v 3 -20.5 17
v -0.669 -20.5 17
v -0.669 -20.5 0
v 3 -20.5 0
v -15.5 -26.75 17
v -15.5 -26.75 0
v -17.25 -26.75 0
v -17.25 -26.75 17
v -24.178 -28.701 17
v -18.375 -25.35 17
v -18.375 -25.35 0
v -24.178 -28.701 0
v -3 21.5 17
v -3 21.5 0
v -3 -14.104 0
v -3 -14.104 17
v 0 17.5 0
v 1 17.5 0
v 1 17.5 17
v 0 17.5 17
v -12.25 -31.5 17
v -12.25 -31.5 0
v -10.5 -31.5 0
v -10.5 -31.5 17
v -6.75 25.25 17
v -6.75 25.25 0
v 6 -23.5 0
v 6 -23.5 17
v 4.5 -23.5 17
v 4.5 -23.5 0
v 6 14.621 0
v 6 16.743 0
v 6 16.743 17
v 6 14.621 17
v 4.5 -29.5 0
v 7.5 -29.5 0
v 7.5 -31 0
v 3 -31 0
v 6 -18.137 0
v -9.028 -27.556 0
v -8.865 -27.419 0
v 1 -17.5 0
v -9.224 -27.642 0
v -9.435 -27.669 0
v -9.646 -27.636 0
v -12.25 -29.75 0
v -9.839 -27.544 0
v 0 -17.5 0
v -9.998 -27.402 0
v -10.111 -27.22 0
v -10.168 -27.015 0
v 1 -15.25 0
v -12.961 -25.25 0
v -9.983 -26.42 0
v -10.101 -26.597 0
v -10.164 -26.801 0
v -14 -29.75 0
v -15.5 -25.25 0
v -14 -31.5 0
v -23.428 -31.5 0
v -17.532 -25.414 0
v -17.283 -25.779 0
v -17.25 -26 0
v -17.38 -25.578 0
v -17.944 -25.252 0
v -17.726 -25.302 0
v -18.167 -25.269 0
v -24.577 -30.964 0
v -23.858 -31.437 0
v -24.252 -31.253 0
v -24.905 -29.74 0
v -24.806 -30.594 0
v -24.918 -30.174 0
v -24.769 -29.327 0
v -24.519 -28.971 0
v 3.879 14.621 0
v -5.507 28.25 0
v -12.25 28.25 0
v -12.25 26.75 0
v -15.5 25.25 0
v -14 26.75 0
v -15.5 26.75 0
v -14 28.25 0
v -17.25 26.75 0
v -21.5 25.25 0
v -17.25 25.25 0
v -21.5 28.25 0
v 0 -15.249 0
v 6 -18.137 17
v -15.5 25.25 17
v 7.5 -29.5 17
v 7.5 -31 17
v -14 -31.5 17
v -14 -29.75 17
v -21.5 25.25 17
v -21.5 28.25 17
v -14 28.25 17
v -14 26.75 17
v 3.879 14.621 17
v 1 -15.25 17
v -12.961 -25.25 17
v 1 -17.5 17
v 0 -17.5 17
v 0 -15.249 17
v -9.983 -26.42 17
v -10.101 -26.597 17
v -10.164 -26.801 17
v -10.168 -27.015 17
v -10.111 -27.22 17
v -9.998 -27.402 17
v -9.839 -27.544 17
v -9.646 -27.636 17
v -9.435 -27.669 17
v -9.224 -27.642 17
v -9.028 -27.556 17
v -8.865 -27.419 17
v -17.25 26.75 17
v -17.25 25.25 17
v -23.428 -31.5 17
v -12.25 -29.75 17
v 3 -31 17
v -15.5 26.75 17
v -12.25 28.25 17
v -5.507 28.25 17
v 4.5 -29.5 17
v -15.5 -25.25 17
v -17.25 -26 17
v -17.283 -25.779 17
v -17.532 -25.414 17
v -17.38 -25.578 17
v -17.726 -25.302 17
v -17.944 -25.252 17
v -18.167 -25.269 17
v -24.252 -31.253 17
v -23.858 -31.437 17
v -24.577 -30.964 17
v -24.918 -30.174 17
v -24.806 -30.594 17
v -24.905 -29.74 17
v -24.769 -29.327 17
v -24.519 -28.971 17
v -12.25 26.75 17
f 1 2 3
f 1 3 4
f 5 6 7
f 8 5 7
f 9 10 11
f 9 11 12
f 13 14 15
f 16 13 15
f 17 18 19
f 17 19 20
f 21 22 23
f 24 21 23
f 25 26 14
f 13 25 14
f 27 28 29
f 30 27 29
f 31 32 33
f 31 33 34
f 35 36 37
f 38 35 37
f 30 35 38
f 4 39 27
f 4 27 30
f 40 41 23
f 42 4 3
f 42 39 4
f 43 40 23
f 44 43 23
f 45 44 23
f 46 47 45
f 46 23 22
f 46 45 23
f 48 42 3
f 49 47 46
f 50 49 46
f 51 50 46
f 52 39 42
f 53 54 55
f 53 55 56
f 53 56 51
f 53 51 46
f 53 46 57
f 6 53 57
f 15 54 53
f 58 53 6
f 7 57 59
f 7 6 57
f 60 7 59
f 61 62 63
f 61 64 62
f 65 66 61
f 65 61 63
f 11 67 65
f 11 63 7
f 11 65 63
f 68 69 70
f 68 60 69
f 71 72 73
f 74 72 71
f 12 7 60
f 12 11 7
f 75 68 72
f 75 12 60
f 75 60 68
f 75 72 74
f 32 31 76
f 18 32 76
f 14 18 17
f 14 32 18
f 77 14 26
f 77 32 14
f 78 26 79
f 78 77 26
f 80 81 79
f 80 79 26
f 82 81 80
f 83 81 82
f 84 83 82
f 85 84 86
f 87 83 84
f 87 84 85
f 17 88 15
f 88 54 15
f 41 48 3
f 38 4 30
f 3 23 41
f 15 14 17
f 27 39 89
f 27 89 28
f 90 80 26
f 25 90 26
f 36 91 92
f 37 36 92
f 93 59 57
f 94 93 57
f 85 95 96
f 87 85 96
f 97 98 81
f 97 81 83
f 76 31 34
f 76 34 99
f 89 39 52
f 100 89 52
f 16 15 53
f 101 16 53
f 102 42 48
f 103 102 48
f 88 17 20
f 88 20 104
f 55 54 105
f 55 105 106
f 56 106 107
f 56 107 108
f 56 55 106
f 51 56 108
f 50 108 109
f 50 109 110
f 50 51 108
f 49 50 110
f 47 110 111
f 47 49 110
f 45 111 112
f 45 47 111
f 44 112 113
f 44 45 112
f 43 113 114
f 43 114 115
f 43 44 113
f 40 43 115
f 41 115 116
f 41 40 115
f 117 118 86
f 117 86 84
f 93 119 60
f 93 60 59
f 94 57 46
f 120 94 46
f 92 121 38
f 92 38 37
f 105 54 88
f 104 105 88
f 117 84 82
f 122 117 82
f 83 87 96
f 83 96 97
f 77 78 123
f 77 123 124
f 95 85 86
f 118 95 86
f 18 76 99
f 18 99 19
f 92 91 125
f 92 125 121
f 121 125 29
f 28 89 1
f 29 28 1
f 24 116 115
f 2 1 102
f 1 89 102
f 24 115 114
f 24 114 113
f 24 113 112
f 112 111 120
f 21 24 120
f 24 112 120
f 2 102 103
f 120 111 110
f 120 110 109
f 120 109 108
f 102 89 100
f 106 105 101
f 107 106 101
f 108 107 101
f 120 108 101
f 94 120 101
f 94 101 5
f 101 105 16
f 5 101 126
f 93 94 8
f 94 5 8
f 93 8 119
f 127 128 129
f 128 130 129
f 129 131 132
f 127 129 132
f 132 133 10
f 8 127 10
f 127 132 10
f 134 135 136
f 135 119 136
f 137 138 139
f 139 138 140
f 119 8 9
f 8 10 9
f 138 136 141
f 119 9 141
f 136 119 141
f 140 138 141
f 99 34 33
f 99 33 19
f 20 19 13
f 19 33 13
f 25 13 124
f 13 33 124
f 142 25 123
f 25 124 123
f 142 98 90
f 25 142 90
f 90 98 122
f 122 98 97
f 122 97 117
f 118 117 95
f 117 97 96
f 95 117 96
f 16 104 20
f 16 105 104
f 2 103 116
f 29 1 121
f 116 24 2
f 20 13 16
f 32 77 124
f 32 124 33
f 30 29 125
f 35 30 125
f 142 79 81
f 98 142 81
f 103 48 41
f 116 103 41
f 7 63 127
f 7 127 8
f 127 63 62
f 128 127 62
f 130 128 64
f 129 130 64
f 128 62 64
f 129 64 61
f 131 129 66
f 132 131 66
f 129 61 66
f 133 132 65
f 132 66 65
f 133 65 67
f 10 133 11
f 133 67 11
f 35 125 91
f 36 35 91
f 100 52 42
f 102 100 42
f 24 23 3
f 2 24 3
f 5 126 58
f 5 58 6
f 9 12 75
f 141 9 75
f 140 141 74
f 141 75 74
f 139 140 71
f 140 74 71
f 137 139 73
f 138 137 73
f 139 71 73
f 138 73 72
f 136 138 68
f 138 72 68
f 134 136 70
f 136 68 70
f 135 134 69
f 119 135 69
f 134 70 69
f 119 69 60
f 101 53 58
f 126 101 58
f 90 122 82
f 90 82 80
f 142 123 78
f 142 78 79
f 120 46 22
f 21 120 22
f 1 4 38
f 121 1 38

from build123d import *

# Parameters (mm, degrees)
PAD_DEPTH = 17


with BuildPart() as part:
    # Sketch → Pad (new body)
    with BuildSketch(Plane.XY):
        with BuildLine():
            Line((0, 17.5), (0, -15.248976))
            Line((-9.983073, -26.419536), (0, -15.248976))
            ThreePointArc((-9.983073, -26.419536), (-9.923619, -27.478522), (-8.864632, -27.41908))
            Line((0, -17.5), (-8.864632, -27.41908))
            Line((1, -17.5), (0, -17.5))
            Line((1, -15.25), (1, -17.5))
            Line((6, -18.136751), (1, -15.25))
            Line((6, -18.136751), (6, -23.5))
            Line((6, -23.5), (4.5, -23.5))
            Line((4.5, -23.5), (4.5, -29.5))
            Line((4.5, -29.5), (7.5, -29.5))
            Line((7.5, -29.5), (7.5, -31))
            Line((3, -31), (7.5, -31))
            Line((3, -20.5), (3, -31))
            Line((-0.669356, -20.5), (3, -20.5))
            Line((-10.5, -31.5), (-0.669356, -20.5))
            Line((-12.25, -31.5), (-10.5, -31.5))
            Line((-12.25, -29.75), (-12.25, -31.5))
            Line((-14, -29.75), (-12.25, -29.75))
            Line((-14, -31.5), (-14, -29.75))
            Line((-23.4282, -31.5), (-14, -31.5))
            ThreePointArc((-24.178201, -28.700962), (-24.877089, -30.388229), (-23.4282, -31.5))
            Line((-18.375, -25.350481), (-24.178201, -28.700962))
            ThreePointArc((-17.25, -26), (-17.625, -25.350481), (-18.375, -25.350481))
            Line((-17.25, -26), (-17.25, -26.75))
            Line((-15.5, -26.75), (-17.25, -26.75))
            Line((-15.5, -25.25), (-15.5, -26.75))
            Line((-12.961323, -25.25), (-15.5, -25.25))
            Line((-3, -14.103777), (-12.961323, -25.25))
            Line((-3, 21.500001), (-3, -14.103777))
            Line((-6.749997, 25.25), (-3, 21.500001))
            Line((-15.5, 25.25), (-6.749997, 25.25))
            Line((-15.5, 26.75), (-15.5, 25.25))
            Line((-17.25, 26.75), (-15.5, 26.75))
            Line((-17.25, 25.25), (-17.25, 26.75))
            Line((-21.5, 25.25), (-17.25, 25.25))
            Line((-21.5, 25.25), (-21.5, 28.25))
            Line((-21.5, 28.25), (-14, 28.25))
            Line((-14, 26.75), (-14, 28.25))
            Line((-12.25, 26.75), (-14, 26.75))
            Line((-12.25, 28.25), (-12.25, 26.75))
            Line((-12.25, 28.25), (-5.507356, 28.25))
            Line((-5.507356, 28.25), (6, 16.74264))
            Line((6, 16.74264), (6, 14.621319))
            Line((6, 14.621319), (3.87868, 14.621319))
            Line((3.87868, 14.621319), (1, 17.5))
            Line((1, 17.5), (0, 17.5))
        make_face()
    extrude(amount=PAD_DEPTH)


solid = part.part
